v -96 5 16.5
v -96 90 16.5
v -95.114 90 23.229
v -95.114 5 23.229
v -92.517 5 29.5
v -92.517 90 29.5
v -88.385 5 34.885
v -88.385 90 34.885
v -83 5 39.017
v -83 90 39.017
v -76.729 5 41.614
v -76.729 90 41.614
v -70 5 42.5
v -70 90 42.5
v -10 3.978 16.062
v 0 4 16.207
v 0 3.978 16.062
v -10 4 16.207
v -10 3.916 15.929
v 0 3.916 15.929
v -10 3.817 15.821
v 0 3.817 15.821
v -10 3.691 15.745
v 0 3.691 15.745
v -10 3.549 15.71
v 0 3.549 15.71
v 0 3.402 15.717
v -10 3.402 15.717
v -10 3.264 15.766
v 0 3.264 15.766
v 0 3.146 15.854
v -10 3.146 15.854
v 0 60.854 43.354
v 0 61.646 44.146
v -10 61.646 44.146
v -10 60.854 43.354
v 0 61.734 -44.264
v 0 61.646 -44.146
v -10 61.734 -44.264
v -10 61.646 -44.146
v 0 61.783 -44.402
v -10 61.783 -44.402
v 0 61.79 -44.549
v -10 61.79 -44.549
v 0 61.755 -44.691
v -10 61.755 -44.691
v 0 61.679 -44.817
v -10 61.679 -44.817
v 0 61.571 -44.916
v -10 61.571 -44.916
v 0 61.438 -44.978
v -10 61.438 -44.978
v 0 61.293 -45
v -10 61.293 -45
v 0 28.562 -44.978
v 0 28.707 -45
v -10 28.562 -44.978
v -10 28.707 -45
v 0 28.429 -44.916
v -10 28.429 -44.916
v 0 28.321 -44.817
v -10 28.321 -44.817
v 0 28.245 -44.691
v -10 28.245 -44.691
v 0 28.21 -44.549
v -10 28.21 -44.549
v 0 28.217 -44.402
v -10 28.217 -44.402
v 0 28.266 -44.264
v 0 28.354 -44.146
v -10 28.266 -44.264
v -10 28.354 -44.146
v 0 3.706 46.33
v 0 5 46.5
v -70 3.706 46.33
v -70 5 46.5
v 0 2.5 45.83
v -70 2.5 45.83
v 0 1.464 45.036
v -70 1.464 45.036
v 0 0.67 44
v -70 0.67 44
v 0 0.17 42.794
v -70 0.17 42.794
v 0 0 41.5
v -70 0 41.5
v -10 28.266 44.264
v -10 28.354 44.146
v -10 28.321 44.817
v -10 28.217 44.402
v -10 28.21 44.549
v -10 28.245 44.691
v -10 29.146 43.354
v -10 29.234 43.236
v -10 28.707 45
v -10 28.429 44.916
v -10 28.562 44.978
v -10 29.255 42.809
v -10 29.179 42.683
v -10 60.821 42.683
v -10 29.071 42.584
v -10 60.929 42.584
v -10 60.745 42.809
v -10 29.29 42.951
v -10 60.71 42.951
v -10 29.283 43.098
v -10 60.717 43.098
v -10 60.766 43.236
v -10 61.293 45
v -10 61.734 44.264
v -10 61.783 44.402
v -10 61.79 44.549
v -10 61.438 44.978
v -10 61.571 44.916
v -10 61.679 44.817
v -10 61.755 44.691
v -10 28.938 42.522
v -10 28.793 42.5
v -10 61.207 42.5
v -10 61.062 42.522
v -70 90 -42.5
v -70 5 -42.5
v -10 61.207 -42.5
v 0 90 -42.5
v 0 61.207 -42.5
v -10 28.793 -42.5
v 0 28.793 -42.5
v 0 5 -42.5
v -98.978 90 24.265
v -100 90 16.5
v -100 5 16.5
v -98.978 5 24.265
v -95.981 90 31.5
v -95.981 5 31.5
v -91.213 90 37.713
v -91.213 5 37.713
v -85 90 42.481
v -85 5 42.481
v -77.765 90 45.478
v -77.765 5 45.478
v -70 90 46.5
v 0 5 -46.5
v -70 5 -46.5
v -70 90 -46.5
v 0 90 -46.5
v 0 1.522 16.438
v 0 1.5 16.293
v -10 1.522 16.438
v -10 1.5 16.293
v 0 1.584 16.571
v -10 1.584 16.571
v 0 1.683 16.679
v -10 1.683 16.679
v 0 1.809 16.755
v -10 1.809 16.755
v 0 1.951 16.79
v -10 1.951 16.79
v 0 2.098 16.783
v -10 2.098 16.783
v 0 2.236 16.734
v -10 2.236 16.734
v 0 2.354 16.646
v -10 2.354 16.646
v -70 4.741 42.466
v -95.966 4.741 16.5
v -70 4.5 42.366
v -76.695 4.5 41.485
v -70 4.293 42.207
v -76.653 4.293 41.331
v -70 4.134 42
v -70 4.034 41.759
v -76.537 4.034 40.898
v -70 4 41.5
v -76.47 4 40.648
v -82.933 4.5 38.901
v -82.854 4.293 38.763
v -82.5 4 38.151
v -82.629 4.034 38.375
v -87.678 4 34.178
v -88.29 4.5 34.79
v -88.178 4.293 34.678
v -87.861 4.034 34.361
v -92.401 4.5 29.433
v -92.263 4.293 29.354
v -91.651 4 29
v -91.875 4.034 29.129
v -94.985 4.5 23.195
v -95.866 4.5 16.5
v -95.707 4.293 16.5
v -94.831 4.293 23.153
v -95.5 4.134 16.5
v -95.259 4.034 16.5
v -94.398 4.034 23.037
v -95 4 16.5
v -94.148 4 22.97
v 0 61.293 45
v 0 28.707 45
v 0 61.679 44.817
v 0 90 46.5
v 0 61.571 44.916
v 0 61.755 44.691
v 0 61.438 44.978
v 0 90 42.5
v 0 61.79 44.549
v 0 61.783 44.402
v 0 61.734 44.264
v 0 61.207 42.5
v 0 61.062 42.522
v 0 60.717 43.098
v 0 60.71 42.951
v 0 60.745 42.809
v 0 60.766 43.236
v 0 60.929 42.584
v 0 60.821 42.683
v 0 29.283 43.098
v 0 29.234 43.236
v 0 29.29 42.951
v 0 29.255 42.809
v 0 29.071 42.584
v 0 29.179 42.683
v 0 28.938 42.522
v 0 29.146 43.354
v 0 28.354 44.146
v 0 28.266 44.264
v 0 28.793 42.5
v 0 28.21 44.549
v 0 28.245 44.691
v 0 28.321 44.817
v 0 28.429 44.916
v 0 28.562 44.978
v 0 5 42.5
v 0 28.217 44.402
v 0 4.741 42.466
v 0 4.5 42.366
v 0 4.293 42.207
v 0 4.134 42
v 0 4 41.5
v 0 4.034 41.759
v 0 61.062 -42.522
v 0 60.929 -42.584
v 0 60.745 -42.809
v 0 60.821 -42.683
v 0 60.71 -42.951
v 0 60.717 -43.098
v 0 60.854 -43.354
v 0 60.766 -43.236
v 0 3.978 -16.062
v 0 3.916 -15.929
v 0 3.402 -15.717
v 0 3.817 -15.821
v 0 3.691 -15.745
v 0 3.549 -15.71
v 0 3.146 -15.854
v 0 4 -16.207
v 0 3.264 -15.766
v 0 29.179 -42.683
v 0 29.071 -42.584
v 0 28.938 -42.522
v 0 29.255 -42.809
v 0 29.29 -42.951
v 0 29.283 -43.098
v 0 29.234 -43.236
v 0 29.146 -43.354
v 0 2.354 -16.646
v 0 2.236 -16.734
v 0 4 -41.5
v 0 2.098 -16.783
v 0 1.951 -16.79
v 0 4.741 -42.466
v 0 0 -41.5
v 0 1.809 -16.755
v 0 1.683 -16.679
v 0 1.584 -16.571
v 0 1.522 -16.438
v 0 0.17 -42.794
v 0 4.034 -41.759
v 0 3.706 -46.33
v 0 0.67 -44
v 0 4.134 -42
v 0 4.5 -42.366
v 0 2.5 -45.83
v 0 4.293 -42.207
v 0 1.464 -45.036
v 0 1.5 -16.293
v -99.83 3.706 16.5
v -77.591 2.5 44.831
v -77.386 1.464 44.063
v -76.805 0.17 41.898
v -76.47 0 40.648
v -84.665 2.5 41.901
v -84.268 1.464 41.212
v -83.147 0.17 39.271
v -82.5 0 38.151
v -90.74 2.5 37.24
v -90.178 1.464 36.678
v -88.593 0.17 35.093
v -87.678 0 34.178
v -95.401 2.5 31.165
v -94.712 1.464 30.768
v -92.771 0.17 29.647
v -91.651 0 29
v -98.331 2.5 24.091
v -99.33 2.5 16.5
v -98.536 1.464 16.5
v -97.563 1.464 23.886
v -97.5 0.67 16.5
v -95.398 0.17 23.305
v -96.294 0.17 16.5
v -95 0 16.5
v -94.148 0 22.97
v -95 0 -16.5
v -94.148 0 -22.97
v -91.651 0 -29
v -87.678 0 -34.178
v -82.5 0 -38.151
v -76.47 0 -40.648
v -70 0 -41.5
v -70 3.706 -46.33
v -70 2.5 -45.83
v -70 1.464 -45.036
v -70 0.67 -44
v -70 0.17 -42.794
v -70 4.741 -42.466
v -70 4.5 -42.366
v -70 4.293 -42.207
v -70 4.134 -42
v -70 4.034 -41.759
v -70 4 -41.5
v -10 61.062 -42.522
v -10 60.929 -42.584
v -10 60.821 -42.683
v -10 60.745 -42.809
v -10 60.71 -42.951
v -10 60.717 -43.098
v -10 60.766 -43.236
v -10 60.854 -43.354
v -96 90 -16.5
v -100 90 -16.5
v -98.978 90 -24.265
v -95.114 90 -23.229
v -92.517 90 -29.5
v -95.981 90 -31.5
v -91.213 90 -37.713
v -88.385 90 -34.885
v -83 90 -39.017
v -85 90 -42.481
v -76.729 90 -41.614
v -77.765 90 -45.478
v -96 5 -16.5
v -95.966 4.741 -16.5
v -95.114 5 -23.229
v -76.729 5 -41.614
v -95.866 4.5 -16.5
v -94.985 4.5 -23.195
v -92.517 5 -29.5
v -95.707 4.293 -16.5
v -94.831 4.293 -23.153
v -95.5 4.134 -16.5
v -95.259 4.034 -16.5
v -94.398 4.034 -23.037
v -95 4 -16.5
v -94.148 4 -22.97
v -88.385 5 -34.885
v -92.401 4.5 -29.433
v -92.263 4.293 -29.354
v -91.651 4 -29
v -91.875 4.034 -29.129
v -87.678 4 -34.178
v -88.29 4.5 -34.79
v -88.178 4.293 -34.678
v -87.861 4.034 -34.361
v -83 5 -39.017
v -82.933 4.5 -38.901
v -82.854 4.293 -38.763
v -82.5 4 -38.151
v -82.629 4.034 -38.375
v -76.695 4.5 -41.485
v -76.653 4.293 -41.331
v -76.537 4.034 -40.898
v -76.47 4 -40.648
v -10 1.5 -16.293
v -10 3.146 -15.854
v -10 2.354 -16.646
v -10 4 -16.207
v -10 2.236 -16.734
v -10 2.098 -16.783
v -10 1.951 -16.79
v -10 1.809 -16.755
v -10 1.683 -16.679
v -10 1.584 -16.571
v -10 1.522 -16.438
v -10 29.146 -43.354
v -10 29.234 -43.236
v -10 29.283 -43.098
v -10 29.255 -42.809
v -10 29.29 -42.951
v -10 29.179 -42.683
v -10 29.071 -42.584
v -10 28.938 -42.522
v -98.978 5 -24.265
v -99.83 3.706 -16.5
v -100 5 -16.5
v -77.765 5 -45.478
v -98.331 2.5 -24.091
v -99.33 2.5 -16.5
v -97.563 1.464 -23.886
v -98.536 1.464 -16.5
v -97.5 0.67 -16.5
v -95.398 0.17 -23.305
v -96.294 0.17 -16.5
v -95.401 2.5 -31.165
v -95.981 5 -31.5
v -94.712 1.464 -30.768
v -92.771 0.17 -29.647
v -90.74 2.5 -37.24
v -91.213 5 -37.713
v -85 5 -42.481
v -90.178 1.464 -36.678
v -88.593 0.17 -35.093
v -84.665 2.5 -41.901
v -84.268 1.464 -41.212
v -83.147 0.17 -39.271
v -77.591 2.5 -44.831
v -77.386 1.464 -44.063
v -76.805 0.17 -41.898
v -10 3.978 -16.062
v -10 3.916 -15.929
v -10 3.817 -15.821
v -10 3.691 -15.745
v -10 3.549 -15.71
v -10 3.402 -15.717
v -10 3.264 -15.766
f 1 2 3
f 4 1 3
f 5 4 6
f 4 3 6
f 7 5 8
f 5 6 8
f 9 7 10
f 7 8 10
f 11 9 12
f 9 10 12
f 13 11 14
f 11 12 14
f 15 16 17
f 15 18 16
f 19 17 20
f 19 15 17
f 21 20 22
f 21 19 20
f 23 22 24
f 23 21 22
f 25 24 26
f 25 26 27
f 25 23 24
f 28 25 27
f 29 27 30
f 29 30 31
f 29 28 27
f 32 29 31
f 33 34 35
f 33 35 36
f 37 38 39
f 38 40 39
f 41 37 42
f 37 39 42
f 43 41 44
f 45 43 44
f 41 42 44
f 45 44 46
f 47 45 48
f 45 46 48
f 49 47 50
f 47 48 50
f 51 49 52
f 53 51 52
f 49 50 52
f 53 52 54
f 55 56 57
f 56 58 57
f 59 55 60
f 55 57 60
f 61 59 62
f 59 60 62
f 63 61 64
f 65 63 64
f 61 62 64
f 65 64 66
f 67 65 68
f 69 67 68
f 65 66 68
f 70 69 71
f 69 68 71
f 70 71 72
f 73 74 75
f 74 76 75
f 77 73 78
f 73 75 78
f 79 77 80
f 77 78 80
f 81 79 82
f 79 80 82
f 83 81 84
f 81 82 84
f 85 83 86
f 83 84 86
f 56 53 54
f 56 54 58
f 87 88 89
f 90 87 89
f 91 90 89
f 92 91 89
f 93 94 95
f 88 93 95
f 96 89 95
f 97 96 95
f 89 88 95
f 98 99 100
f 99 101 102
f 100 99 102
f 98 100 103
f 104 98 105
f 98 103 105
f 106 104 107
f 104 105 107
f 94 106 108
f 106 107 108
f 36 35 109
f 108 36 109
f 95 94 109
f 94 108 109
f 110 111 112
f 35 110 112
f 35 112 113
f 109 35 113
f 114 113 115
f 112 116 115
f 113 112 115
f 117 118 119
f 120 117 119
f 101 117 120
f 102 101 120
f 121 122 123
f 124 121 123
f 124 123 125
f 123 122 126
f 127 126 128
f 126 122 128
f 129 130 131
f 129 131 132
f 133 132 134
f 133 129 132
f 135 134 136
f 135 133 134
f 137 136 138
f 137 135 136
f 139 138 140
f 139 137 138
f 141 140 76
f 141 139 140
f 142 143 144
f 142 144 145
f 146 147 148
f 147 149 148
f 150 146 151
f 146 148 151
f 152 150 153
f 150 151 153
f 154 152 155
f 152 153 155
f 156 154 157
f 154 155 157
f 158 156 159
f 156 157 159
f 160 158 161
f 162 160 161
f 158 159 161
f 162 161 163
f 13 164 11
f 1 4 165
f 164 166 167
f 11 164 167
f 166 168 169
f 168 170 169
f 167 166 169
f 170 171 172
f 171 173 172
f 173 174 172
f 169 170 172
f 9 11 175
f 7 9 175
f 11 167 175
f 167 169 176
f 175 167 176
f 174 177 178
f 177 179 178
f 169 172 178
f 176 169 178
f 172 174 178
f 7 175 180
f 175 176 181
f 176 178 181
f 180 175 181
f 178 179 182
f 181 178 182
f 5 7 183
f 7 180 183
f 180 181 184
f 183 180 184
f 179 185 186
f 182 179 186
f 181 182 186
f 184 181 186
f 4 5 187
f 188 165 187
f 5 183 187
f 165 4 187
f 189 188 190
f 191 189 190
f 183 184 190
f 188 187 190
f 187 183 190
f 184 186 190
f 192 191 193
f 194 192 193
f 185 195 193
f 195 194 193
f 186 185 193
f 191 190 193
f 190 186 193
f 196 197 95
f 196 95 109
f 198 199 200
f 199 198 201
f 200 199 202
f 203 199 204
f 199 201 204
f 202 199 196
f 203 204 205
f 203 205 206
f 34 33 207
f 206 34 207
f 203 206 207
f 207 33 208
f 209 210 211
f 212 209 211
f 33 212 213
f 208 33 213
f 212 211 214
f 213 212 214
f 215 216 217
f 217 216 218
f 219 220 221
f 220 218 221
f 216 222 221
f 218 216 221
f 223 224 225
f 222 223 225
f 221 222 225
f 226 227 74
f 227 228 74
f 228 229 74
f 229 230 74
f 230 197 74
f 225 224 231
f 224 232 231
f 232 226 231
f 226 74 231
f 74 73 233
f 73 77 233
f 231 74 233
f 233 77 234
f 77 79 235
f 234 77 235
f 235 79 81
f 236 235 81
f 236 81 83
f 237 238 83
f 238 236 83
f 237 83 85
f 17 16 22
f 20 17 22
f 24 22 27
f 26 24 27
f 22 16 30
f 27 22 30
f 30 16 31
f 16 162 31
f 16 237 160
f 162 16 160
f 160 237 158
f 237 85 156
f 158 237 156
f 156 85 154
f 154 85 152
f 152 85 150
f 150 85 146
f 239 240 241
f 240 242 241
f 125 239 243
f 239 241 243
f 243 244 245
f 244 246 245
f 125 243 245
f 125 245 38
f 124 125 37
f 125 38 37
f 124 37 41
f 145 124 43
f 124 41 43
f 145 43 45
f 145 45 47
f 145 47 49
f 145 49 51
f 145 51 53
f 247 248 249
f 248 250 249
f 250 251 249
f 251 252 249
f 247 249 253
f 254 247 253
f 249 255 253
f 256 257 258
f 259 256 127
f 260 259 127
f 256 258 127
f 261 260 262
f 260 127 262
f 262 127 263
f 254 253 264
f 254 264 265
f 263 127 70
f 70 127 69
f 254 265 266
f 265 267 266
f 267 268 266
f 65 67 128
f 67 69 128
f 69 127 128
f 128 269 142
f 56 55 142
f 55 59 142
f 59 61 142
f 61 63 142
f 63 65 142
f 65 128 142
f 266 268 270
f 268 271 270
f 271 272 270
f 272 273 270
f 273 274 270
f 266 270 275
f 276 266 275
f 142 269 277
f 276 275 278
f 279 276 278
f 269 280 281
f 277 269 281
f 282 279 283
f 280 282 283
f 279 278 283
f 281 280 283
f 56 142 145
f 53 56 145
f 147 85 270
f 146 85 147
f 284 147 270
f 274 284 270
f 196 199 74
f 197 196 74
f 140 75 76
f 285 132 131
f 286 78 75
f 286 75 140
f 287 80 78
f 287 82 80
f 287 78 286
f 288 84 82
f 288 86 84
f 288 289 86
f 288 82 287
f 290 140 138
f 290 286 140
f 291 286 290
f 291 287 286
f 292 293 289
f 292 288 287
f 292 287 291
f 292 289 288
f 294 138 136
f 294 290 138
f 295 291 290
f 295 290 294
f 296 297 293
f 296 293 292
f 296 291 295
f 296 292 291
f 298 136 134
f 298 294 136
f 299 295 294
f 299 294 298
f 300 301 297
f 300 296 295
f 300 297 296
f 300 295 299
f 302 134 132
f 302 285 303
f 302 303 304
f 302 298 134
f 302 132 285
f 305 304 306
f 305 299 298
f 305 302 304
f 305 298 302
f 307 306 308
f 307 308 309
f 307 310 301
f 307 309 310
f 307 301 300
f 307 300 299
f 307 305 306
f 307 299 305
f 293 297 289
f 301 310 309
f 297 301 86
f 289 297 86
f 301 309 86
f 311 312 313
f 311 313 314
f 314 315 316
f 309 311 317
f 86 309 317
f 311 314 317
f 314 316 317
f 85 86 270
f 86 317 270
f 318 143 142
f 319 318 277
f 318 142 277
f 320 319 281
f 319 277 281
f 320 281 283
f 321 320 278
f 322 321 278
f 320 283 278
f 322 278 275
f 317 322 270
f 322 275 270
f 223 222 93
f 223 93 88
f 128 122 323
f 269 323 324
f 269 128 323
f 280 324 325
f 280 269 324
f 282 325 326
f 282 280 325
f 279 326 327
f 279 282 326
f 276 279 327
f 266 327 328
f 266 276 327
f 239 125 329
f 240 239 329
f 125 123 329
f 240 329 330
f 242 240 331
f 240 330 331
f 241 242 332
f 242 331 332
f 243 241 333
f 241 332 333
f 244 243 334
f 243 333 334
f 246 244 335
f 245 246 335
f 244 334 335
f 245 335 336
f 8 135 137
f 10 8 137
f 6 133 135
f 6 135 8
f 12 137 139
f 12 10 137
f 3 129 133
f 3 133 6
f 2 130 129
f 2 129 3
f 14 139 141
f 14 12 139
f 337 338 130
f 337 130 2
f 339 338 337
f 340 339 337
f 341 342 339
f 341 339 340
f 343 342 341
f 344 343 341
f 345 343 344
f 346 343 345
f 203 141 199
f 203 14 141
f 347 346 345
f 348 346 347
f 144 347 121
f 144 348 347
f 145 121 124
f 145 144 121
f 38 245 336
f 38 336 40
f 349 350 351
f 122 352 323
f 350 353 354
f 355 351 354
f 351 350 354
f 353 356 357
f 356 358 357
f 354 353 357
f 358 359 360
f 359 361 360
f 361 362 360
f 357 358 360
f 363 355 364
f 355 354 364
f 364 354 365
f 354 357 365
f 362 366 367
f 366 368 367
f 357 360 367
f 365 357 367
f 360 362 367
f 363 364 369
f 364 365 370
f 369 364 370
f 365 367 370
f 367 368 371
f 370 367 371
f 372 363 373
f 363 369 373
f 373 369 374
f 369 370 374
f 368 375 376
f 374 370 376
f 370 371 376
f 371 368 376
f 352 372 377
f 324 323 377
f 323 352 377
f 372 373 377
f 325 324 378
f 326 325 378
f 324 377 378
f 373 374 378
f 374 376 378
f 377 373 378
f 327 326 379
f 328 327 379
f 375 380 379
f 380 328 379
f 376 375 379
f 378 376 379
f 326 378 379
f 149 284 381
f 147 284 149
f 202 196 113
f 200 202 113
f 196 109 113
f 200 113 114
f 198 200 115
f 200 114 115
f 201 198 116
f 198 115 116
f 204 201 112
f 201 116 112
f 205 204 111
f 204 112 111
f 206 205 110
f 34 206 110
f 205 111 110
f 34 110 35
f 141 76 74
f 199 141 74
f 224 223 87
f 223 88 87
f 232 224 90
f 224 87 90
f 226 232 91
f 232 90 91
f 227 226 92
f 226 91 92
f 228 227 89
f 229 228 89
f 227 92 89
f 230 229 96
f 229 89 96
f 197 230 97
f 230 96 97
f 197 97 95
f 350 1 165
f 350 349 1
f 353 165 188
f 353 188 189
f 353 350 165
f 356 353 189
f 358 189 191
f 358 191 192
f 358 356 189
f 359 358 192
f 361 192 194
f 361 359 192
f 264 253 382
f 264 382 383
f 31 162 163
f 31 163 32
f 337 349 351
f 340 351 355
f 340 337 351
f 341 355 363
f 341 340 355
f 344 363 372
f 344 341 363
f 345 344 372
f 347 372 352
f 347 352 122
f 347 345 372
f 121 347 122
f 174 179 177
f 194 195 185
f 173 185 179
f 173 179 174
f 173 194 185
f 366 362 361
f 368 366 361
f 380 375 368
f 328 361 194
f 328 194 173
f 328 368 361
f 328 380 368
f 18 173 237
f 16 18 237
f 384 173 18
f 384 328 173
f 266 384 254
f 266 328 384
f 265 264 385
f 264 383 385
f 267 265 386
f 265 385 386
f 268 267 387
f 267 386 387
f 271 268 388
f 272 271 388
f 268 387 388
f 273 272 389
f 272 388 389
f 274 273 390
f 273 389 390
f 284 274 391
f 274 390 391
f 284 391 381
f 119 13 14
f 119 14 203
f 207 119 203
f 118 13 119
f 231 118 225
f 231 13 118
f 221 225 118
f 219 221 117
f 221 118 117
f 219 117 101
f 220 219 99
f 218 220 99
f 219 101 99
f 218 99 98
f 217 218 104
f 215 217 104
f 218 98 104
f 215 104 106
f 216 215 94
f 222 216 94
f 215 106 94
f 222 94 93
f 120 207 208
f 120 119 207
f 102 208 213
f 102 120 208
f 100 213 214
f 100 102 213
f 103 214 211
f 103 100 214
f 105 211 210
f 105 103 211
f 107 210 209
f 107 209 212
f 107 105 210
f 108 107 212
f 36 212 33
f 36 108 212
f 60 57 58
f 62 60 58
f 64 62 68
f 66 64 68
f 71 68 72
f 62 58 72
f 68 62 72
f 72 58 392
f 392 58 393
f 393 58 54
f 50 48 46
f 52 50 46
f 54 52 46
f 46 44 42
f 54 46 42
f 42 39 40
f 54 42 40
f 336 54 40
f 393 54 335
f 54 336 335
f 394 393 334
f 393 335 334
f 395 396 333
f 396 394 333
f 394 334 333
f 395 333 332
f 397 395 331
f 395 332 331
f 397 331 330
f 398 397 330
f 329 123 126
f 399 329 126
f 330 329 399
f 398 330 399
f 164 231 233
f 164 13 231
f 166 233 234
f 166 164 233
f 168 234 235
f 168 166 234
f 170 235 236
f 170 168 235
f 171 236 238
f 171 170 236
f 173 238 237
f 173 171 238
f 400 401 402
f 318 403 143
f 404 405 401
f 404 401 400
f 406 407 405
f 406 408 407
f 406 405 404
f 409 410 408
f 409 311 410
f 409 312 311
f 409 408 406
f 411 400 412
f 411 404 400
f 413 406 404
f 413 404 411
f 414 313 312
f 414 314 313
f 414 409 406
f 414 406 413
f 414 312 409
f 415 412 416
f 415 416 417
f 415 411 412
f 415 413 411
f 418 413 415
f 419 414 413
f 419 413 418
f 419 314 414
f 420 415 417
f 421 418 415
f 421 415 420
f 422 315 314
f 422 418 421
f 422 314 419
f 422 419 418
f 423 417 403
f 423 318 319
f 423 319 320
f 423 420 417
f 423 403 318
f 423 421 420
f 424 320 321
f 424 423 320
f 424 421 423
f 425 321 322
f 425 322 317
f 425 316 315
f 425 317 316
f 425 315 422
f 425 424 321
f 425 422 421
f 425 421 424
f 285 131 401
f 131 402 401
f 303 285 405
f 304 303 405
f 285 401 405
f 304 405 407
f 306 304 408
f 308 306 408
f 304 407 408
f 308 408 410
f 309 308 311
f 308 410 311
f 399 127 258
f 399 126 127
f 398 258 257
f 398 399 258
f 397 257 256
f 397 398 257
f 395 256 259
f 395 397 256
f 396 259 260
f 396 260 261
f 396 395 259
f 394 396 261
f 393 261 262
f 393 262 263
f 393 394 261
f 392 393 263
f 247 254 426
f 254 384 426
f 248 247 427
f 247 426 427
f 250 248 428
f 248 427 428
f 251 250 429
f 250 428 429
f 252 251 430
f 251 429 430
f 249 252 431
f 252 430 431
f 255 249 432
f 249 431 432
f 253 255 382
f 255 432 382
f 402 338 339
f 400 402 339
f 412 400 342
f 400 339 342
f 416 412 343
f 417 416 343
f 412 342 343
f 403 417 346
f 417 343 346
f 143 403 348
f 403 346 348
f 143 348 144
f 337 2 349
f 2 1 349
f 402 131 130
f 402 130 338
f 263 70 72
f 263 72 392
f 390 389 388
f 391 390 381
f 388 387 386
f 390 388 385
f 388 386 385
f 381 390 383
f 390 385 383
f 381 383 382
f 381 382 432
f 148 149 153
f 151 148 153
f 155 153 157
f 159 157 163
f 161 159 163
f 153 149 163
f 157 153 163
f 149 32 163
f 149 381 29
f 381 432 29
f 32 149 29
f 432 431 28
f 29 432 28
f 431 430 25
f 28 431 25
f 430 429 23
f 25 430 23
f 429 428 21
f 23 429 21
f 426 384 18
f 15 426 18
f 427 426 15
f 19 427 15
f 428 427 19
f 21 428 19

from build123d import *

# Parameters (mm, degrees)
SKETCH_1_W           = 100
SKETCH_1_H           = 93
EXTRUDE_1_DEPTH      = 90
FILLET_8_R           = 30
FILLET_9_R           = 5
SHELL_4_T            = -4
CUT_EXTRUDE_16_DEPTH = 10
FILLET_12_R          = 0.5


with BuildPart() as part:
    # 草圖1 → 填料-伸長1 (new body)
    with BuildSketch(Plane(origin=(0, 0, 0), x_dir=(1, 0, 0), z_dir=(0, 1, 0))):
        with Locations((-50, 0)):
            Rectangle(SKETCH_1_W, SKETCH_1_H)
    extrude(amount=EXTRUDE_1_DEPTH)

    # 圓角8
    fillet_8_edges = [part.edges().sort_by_distance(p)[0] for p in [
        (-100, 45, 46.5),
        (-100, 45, -46.5),
    ]]
    fillet(fillet_8_edges, radius=FILLET_8_R)

    # 圓角9
    fillet_9_edges = [part.edges().sort_by_distance(p)[0] for p in [
        (-100, 0, 0),
        (-35, 0, 46.5),
        (-91.213203436, 0, 37.713203436),
        (-91.213203436, 0, -37.713203436),
        (-35, 0, -46.5),
    ]]
    fillet(fillet_9_edges, radius=FILLET_9_R)

    # 薄殼4
    shell_4_openings = [part.faces().sort_by_distance(p)[0] for p in [
        (-48.123603577, 90, 0),
        (0, 45.056329123, 0),
    ]]
    offset(amount=SHELL_4_T, openings=shell_4_openings, kind=Kind.INTERSECTION)

    # 草圖21 → 除料-伸長16 (cut)
    with BuildSketch(Plane(origin=(0, 0, 0), x_dir=(0, 0, -1), z_dir=(1, 0, 0))):
        Polygon((-42.5, 60), (42.5, 60), (45, 62.5), (45, 27.5), (42.5, 30), (15, 30), (15, 4), (17.5, 1.5), (-17.5, 1.5), (-15, 4), (-15, 30), (-42.5, 30), (-45, 27.5), (-45, 62.5), align=None)
    extrude(amount=-CUT_EXTRUDE_16_DEPTH, mode=Mode.SUBTRACT)

    # 圓角12
    fillet_12_edges = [part.edges().sort_by_distance(p)[0] for p in [
        (-5, 60, -42.5),
        (-5, 62.5, -45),
        (-5, 27.5, -45),
        (-5, 30, -42.5),
        (-5, 4, -15),
        (-5, 1.5, -17.5),
        (-5, 1.5, 17.5),
        (-5, 4, 15),
        (-5, 30, 42.5),
        (-5, 27.5, 45),
        (-5, 62.5, 45),
        (-5, 60, 42.5),
    ]]
    fillet(fillet_12_edges, radius=FILLET_12_R)


solid = part.part
